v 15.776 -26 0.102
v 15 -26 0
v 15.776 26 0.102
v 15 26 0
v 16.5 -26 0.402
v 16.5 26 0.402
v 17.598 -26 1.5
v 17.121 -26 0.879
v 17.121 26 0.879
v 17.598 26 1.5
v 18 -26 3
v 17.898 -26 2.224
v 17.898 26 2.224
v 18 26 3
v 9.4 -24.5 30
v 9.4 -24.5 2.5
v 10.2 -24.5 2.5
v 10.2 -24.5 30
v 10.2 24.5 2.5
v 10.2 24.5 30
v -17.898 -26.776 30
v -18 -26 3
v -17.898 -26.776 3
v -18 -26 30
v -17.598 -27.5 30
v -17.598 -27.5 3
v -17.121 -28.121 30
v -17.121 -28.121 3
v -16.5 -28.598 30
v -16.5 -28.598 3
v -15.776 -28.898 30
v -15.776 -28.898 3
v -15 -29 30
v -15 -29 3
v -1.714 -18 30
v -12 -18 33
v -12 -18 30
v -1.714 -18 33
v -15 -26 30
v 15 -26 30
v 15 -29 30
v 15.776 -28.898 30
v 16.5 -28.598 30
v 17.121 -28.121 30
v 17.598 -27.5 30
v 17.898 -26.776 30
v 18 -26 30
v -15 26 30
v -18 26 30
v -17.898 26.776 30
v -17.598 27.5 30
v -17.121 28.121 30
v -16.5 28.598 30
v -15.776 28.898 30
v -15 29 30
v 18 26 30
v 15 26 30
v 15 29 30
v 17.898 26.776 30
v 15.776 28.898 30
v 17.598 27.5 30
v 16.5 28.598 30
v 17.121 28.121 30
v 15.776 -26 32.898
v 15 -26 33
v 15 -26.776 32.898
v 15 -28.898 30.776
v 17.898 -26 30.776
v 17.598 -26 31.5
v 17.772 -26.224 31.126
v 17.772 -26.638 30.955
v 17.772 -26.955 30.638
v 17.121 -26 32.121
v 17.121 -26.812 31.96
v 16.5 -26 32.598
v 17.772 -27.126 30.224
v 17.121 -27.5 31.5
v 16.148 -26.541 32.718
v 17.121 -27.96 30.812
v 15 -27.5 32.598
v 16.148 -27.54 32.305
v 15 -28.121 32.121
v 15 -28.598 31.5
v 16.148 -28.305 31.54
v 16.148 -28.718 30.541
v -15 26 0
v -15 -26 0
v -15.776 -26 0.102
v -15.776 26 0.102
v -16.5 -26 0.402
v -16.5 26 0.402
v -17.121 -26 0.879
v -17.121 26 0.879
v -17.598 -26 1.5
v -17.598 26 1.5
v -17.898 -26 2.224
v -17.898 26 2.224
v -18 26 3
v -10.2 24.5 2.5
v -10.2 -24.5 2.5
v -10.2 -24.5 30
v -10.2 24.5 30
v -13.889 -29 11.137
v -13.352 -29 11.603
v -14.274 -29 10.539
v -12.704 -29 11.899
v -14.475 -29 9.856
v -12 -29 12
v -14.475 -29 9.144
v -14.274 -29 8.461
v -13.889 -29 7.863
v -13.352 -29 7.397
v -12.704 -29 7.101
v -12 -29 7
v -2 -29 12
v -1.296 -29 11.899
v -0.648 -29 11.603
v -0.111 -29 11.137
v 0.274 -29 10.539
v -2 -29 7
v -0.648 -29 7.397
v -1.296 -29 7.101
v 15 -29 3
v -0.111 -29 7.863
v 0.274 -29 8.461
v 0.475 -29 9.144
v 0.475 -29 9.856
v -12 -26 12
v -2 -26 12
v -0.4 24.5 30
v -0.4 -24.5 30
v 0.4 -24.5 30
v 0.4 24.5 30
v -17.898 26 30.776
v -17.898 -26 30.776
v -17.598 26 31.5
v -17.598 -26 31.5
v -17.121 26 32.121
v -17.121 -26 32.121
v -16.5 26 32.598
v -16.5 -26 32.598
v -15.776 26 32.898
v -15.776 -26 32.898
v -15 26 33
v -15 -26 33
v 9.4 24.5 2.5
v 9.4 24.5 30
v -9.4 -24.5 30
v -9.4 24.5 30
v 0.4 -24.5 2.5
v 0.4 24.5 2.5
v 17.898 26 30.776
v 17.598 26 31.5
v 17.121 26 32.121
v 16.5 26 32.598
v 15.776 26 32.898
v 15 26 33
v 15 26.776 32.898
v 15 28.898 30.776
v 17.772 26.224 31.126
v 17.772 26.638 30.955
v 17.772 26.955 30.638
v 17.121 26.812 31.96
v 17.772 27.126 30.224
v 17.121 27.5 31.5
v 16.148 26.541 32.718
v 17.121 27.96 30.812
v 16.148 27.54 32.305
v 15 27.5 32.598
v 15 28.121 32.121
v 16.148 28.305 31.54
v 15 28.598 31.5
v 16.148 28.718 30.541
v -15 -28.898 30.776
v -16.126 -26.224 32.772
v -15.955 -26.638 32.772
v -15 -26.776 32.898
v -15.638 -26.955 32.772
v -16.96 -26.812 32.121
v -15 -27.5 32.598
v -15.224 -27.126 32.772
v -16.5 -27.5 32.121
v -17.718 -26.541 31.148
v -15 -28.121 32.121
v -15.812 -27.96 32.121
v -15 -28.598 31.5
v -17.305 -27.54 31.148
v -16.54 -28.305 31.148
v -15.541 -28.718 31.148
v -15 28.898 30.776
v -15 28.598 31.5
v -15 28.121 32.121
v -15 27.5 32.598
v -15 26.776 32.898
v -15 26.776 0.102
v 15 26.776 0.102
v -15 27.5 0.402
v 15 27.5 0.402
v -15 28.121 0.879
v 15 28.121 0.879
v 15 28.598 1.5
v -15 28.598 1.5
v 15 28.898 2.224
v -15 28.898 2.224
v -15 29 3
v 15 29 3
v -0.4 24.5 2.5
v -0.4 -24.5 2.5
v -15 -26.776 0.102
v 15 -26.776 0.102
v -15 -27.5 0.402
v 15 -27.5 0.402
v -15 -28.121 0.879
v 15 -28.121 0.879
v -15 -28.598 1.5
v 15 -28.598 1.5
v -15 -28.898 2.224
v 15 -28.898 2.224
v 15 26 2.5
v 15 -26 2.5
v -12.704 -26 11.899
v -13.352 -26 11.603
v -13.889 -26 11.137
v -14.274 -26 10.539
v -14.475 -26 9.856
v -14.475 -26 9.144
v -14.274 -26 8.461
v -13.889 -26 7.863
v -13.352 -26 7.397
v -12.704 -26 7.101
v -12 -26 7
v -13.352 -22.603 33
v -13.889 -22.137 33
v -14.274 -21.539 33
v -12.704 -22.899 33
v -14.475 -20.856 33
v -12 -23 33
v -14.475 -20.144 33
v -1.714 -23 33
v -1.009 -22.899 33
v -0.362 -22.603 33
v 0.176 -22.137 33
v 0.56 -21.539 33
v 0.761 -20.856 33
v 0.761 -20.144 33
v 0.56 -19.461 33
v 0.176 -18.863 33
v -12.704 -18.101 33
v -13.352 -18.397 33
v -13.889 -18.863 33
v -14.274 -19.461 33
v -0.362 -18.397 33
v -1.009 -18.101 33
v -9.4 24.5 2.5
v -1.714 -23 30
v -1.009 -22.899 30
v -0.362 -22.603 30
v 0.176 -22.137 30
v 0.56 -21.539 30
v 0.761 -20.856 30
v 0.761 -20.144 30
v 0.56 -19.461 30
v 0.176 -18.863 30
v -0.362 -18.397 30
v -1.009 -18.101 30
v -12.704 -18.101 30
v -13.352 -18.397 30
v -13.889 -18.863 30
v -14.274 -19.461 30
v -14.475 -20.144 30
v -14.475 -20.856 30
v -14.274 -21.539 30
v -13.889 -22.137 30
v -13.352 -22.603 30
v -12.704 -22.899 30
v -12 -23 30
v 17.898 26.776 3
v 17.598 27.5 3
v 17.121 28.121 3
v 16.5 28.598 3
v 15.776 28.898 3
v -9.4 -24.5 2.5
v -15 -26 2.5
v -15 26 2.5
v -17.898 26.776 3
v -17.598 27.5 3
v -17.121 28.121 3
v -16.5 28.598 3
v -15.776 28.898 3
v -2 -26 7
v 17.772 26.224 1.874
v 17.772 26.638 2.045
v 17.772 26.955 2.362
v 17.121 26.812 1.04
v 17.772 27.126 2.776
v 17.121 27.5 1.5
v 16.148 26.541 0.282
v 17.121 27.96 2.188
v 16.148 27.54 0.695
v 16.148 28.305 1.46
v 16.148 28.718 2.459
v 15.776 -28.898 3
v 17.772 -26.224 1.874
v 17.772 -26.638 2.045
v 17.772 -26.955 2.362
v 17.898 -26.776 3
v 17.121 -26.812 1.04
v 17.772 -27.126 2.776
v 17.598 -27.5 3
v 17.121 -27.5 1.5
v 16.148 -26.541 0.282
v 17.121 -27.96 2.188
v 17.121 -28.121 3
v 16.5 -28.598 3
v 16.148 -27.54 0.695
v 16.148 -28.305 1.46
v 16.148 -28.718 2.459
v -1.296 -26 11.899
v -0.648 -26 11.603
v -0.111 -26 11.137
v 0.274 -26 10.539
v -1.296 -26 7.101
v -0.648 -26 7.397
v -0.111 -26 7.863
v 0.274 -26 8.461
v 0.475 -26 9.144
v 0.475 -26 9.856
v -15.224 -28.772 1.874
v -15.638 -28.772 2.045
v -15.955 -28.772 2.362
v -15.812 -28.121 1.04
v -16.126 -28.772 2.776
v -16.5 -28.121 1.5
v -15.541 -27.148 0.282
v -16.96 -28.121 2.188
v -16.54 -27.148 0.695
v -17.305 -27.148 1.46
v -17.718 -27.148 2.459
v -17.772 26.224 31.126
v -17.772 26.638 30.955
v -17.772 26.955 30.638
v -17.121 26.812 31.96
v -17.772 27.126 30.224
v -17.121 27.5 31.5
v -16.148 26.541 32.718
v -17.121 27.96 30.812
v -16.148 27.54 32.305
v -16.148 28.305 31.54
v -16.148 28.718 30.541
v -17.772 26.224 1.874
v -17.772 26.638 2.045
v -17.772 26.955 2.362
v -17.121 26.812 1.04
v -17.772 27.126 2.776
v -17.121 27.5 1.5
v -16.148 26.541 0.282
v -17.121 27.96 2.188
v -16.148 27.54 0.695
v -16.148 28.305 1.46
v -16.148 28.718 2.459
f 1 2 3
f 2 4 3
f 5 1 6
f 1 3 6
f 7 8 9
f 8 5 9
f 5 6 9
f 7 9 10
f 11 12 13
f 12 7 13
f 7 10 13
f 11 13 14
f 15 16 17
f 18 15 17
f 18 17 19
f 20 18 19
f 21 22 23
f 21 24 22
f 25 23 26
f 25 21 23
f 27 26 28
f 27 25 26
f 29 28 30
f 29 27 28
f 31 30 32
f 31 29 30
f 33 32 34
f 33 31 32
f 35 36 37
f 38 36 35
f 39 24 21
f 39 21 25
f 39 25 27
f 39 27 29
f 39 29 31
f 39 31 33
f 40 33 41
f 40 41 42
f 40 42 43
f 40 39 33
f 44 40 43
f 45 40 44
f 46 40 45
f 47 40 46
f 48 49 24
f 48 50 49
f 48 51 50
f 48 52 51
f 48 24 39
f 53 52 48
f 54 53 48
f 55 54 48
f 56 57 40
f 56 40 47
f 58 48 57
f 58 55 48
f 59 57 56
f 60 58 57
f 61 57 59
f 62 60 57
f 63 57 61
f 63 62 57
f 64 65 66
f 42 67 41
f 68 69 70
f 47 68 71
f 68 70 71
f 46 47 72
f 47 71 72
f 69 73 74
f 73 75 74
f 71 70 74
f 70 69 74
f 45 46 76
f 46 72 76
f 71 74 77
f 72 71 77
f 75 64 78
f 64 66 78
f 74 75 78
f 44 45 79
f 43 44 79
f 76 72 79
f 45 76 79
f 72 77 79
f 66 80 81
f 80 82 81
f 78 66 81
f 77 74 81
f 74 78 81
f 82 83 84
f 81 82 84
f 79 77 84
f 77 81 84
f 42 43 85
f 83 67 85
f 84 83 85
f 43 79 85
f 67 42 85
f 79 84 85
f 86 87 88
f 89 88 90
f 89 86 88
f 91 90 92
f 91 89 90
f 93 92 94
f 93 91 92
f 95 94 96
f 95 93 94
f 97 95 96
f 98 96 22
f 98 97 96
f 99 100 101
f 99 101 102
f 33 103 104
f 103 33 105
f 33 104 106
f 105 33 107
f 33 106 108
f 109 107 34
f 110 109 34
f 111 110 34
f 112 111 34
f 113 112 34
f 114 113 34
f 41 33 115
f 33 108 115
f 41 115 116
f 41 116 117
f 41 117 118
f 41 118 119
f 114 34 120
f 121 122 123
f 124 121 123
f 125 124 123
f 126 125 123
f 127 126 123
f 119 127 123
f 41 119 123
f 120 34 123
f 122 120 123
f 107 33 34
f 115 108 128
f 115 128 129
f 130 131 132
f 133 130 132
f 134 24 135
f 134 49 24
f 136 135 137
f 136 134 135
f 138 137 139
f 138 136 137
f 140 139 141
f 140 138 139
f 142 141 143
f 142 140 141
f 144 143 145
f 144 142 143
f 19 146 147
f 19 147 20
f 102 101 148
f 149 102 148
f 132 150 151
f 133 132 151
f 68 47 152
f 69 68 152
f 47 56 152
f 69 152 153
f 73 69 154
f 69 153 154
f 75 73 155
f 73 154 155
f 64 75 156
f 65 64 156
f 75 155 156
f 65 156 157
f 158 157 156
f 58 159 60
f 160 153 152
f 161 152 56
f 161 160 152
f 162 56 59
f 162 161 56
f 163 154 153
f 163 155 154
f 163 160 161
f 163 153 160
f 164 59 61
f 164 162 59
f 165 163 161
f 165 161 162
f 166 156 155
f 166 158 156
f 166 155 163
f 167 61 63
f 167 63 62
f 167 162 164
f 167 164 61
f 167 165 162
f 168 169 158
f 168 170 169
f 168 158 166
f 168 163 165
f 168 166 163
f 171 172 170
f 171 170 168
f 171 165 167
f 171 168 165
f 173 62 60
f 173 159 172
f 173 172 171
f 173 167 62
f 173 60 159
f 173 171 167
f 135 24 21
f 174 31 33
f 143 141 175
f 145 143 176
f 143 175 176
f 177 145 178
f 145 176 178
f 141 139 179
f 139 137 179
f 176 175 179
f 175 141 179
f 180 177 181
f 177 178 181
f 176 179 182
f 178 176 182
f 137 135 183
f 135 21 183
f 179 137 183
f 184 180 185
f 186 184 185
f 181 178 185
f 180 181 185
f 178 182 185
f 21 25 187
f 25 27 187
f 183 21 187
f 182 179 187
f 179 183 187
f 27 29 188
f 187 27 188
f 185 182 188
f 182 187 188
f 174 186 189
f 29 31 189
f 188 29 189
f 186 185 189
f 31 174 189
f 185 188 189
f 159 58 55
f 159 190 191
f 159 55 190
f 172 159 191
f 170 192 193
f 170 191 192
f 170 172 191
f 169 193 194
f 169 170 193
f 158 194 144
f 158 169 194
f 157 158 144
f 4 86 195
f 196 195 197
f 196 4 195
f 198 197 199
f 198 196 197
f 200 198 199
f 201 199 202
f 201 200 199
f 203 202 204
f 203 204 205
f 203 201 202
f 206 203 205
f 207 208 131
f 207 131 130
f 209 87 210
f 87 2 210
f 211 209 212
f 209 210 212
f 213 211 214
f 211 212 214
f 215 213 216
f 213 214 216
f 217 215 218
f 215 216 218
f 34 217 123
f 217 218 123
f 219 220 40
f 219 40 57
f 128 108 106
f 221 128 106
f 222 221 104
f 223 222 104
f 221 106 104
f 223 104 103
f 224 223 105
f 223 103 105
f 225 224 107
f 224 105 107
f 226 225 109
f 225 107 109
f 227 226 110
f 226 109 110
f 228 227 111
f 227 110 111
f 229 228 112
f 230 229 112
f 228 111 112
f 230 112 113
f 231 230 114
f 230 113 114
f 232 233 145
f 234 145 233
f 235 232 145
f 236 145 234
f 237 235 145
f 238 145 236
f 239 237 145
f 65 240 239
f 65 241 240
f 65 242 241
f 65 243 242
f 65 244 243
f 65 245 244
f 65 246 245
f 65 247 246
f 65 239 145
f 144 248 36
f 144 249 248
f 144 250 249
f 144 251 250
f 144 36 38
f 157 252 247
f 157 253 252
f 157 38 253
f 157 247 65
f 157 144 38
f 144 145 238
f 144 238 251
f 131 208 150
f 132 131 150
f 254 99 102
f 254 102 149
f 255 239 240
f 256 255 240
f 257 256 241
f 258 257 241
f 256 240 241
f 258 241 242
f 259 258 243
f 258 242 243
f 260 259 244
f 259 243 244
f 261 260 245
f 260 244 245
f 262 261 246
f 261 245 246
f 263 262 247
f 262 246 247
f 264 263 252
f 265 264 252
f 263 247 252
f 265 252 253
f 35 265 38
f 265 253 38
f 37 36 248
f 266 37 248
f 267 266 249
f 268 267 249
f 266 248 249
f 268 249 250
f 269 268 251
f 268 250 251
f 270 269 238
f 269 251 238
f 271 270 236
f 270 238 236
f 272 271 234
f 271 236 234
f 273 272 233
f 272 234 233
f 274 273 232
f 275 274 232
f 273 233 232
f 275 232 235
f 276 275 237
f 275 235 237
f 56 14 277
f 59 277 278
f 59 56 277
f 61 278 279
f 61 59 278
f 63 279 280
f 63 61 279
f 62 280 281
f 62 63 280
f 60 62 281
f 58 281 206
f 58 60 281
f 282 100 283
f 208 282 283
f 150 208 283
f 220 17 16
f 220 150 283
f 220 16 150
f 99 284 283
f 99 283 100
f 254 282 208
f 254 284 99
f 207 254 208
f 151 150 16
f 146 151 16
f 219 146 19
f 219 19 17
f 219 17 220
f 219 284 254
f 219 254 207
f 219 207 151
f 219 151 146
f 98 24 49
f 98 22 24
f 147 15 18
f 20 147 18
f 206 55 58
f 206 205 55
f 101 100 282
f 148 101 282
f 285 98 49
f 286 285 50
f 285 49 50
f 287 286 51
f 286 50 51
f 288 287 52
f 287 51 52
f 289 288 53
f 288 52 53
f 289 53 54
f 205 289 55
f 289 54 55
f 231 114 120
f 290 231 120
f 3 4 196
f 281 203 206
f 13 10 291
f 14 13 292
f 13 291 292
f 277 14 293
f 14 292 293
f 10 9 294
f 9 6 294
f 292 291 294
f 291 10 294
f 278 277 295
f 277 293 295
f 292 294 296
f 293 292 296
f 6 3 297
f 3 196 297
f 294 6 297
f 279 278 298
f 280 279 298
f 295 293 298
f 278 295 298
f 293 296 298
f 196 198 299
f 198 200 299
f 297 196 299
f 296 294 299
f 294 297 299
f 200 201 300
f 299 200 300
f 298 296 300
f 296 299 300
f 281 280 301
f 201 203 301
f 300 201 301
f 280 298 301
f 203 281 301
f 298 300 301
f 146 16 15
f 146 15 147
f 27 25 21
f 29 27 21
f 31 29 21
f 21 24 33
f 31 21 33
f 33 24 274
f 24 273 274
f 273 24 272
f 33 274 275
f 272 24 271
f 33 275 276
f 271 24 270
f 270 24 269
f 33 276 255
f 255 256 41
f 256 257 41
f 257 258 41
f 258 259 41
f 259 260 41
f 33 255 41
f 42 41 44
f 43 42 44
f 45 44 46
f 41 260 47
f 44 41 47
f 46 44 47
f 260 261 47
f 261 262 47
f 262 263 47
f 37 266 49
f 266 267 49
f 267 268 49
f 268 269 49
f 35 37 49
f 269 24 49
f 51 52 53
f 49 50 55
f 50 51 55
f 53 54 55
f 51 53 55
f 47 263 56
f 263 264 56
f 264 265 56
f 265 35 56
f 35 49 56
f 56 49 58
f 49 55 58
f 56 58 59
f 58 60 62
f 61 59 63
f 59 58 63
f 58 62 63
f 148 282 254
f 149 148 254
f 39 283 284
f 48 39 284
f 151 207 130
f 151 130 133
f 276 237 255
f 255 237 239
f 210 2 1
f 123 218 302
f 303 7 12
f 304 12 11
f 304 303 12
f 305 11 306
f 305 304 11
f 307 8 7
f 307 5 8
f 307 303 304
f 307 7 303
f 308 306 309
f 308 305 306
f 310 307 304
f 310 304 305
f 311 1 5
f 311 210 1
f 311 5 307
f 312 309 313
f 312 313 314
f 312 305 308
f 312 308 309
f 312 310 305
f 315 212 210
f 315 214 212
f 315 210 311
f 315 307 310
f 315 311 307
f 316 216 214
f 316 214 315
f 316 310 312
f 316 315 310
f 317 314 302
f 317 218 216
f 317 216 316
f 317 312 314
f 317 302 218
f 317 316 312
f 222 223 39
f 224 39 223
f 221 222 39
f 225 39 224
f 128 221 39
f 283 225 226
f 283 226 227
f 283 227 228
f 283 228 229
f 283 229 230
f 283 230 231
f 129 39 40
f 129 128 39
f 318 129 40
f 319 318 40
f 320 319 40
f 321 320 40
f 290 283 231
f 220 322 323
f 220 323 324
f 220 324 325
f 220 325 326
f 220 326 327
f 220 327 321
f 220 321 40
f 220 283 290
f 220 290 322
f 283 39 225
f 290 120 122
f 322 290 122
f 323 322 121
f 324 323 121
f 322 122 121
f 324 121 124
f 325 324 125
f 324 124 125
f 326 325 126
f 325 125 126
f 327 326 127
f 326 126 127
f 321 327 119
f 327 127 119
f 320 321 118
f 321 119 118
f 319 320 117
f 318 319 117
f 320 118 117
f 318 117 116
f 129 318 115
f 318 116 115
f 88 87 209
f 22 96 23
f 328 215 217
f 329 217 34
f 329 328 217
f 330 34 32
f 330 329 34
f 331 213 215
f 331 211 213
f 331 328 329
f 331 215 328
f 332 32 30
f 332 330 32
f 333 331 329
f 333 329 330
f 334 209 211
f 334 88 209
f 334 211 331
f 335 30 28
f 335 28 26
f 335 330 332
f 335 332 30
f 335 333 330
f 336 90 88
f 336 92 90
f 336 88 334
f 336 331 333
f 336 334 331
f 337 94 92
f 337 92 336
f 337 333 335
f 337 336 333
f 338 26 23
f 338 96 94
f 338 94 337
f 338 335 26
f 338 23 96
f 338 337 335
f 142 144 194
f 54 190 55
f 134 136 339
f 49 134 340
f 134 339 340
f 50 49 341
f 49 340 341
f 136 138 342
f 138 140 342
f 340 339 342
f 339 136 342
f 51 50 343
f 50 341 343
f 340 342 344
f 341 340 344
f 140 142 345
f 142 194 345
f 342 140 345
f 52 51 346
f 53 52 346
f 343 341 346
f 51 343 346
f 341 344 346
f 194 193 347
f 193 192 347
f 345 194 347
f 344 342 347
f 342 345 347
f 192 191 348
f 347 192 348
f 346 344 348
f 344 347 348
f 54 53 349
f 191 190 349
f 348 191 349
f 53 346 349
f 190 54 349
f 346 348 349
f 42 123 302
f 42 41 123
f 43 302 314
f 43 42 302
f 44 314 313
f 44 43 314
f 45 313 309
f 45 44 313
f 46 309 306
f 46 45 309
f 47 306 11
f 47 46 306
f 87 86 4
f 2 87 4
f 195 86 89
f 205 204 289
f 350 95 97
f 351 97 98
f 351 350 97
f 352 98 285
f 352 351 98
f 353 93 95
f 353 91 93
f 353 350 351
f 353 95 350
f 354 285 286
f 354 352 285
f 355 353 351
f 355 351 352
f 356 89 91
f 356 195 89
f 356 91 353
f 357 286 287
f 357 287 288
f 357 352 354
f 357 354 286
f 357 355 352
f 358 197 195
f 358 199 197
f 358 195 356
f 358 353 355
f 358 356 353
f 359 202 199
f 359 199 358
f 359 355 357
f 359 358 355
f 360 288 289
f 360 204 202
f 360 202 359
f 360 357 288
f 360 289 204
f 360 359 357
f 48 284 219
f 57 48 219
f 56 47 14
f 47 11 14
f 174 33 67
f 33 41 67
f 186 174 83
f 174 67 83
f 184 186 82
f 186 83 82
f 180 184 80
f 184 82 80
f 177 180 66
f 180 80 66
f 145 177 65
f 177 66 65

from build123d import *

# Parameters (mm, degrees)
F0_W      = 36
F0_H      = 58
F0_W_2    = 30
F0_H_2    = 52
F1_DEPTH  = 30
F2_DEPTH  = 2.5
F3_W      = 10
F3_H      = 5
F4_DEPTH  = 25
F5_START  = 30
F5_DEPTH  = 3
F6_R      = 2.99999
F6_2_R    = 2.99999
F7_W      = 10.2862860618
F7_H      = 5
F8_DEPTH  = 3
F9_W      = 0.8
F9_H      = 49
F10_DEPTH = 27.5


# Not quite as in the source:
# - a fillet or chamfer is up to 0.001 mm smaller than in the source, because OpenCascade refuses the exact size


with BuildPart() as f1:
    # F0 (on Top) → F1 (new body)
    with BuildSketch(Plane.XY):
        Rectangle(F0_W, F0_H)
        Rectangle(F0_W_2, F0_H_2, mode=Mode.SUBTRACT)
    extrude(amount=F1_DEPTH)

    # F0 (on Top) → F2 (join)
    with BuildSketch(Plane.XY):
        Rectangle(F0_W_2, F0_H_2)
    extrude(amount=F2_DEPTH)

    # F3 (on face) → F4 (cut)
    with BuildSketch(Plane.XZ.offset(29)):
        with Locations((-7, 9.5)):
            Rectangle(F3_W, F3_H)
        with BuildLine():
            Line((-12, 7), (-12, 12))
            ThreePointArc((-12, 12), (-14.5, 9.5), (-12, 7))
        make_face()
        with BuildLine():
            ThreePointArc((-2, 7), (0.5, 9.5), (-2, 12))
            Line((-2, 12), (-2, 7))
        make_face()
    extrude(amount=-F4_DEPTH, mode=Mode.SUBTRACT)

    # F6 (radius 3 in the source; OpenCascade refuses exactly that, so slightly less here)
    f6_edges = [f1.edges().sort_by_distance(p)[0] for p in [
        (0, 29, 0),
        (-18, 0, 0),
        (0, -29, 0),
        (18, 0, 0),
        (-18, -29, 15),
        (18, -29, 15),
        (18, 29, 15),
        (-18, 29, 15),
    ]]
    fillet(f6_edges, radius=F6_R)

    # F9 (on face) → F10 (join)
    with BuildSketch(Plane.XY.offset(2.5)):
        with Locations((-9.8, 0)):
            Rectangle(F9_W, F9_H)
        Rectangle(F9_W, F9_H)
        with Locations((9.8, 0)):
            Rectangle(F9_W, F9_H)
    extrude(amount=F10_DEPTH)


with BuildPart() as f5:
    # F0 (on Top) → F5 (new body)
    with BuildSketch(Plane.XY.offset(F5_START)):
        Rectangle(F0_W, F0_H)
        Rectangle(F0_W_2, F0_H_2, mode=Mode.SUBTRACT)
        Rectangle(F0_W_2, F0_H_2)
    extrude(amount=F5_DEPTH)

    # F6#2 (radius 3 in the source; OpenCascade refuses exactly that, so slightly less here)
    f6_2_edges = [f5.edges().sort_by_distance(p)[0] for p in [
        (-18, -29, 31.5),
        (0, 29, 33),
        (-18, 0, 33),
        (0, -29, 33),
        (18, 0, 33),
        (18, -29, 31.5),
        (18, 29, 31.5),
        (-18, 29, 31.5),
    ]]
    fillet(f6_2_edges, radius=F6_2_R)

    # F7 (on face) → F8 (cut)
    with BuildSketch(Plane.XY.offset(33)):
        with Locations((-6.8568569691, -20.5)):
            Rectangle(F7_W, F7_H)
        with BuildLine():
            Line((-12, -23), (-12, -18))
            ThreePointArc((-12, -18), (-14.5, -20.5), (-12, -23))
        make_face()
        with BuildLine():
            ThreePointArc((-1.7137139382, -23), (0.7862860618, -20.5), (-1.7137139382, -18))
            Line((-1.7137139382, -18), (-1.7137139382, -23))
        make_face()
    extrude(amount=-F8_DEPTH, mode=Mode.SUBTRACT)


solid = Compound([f1.part, f5.part])
